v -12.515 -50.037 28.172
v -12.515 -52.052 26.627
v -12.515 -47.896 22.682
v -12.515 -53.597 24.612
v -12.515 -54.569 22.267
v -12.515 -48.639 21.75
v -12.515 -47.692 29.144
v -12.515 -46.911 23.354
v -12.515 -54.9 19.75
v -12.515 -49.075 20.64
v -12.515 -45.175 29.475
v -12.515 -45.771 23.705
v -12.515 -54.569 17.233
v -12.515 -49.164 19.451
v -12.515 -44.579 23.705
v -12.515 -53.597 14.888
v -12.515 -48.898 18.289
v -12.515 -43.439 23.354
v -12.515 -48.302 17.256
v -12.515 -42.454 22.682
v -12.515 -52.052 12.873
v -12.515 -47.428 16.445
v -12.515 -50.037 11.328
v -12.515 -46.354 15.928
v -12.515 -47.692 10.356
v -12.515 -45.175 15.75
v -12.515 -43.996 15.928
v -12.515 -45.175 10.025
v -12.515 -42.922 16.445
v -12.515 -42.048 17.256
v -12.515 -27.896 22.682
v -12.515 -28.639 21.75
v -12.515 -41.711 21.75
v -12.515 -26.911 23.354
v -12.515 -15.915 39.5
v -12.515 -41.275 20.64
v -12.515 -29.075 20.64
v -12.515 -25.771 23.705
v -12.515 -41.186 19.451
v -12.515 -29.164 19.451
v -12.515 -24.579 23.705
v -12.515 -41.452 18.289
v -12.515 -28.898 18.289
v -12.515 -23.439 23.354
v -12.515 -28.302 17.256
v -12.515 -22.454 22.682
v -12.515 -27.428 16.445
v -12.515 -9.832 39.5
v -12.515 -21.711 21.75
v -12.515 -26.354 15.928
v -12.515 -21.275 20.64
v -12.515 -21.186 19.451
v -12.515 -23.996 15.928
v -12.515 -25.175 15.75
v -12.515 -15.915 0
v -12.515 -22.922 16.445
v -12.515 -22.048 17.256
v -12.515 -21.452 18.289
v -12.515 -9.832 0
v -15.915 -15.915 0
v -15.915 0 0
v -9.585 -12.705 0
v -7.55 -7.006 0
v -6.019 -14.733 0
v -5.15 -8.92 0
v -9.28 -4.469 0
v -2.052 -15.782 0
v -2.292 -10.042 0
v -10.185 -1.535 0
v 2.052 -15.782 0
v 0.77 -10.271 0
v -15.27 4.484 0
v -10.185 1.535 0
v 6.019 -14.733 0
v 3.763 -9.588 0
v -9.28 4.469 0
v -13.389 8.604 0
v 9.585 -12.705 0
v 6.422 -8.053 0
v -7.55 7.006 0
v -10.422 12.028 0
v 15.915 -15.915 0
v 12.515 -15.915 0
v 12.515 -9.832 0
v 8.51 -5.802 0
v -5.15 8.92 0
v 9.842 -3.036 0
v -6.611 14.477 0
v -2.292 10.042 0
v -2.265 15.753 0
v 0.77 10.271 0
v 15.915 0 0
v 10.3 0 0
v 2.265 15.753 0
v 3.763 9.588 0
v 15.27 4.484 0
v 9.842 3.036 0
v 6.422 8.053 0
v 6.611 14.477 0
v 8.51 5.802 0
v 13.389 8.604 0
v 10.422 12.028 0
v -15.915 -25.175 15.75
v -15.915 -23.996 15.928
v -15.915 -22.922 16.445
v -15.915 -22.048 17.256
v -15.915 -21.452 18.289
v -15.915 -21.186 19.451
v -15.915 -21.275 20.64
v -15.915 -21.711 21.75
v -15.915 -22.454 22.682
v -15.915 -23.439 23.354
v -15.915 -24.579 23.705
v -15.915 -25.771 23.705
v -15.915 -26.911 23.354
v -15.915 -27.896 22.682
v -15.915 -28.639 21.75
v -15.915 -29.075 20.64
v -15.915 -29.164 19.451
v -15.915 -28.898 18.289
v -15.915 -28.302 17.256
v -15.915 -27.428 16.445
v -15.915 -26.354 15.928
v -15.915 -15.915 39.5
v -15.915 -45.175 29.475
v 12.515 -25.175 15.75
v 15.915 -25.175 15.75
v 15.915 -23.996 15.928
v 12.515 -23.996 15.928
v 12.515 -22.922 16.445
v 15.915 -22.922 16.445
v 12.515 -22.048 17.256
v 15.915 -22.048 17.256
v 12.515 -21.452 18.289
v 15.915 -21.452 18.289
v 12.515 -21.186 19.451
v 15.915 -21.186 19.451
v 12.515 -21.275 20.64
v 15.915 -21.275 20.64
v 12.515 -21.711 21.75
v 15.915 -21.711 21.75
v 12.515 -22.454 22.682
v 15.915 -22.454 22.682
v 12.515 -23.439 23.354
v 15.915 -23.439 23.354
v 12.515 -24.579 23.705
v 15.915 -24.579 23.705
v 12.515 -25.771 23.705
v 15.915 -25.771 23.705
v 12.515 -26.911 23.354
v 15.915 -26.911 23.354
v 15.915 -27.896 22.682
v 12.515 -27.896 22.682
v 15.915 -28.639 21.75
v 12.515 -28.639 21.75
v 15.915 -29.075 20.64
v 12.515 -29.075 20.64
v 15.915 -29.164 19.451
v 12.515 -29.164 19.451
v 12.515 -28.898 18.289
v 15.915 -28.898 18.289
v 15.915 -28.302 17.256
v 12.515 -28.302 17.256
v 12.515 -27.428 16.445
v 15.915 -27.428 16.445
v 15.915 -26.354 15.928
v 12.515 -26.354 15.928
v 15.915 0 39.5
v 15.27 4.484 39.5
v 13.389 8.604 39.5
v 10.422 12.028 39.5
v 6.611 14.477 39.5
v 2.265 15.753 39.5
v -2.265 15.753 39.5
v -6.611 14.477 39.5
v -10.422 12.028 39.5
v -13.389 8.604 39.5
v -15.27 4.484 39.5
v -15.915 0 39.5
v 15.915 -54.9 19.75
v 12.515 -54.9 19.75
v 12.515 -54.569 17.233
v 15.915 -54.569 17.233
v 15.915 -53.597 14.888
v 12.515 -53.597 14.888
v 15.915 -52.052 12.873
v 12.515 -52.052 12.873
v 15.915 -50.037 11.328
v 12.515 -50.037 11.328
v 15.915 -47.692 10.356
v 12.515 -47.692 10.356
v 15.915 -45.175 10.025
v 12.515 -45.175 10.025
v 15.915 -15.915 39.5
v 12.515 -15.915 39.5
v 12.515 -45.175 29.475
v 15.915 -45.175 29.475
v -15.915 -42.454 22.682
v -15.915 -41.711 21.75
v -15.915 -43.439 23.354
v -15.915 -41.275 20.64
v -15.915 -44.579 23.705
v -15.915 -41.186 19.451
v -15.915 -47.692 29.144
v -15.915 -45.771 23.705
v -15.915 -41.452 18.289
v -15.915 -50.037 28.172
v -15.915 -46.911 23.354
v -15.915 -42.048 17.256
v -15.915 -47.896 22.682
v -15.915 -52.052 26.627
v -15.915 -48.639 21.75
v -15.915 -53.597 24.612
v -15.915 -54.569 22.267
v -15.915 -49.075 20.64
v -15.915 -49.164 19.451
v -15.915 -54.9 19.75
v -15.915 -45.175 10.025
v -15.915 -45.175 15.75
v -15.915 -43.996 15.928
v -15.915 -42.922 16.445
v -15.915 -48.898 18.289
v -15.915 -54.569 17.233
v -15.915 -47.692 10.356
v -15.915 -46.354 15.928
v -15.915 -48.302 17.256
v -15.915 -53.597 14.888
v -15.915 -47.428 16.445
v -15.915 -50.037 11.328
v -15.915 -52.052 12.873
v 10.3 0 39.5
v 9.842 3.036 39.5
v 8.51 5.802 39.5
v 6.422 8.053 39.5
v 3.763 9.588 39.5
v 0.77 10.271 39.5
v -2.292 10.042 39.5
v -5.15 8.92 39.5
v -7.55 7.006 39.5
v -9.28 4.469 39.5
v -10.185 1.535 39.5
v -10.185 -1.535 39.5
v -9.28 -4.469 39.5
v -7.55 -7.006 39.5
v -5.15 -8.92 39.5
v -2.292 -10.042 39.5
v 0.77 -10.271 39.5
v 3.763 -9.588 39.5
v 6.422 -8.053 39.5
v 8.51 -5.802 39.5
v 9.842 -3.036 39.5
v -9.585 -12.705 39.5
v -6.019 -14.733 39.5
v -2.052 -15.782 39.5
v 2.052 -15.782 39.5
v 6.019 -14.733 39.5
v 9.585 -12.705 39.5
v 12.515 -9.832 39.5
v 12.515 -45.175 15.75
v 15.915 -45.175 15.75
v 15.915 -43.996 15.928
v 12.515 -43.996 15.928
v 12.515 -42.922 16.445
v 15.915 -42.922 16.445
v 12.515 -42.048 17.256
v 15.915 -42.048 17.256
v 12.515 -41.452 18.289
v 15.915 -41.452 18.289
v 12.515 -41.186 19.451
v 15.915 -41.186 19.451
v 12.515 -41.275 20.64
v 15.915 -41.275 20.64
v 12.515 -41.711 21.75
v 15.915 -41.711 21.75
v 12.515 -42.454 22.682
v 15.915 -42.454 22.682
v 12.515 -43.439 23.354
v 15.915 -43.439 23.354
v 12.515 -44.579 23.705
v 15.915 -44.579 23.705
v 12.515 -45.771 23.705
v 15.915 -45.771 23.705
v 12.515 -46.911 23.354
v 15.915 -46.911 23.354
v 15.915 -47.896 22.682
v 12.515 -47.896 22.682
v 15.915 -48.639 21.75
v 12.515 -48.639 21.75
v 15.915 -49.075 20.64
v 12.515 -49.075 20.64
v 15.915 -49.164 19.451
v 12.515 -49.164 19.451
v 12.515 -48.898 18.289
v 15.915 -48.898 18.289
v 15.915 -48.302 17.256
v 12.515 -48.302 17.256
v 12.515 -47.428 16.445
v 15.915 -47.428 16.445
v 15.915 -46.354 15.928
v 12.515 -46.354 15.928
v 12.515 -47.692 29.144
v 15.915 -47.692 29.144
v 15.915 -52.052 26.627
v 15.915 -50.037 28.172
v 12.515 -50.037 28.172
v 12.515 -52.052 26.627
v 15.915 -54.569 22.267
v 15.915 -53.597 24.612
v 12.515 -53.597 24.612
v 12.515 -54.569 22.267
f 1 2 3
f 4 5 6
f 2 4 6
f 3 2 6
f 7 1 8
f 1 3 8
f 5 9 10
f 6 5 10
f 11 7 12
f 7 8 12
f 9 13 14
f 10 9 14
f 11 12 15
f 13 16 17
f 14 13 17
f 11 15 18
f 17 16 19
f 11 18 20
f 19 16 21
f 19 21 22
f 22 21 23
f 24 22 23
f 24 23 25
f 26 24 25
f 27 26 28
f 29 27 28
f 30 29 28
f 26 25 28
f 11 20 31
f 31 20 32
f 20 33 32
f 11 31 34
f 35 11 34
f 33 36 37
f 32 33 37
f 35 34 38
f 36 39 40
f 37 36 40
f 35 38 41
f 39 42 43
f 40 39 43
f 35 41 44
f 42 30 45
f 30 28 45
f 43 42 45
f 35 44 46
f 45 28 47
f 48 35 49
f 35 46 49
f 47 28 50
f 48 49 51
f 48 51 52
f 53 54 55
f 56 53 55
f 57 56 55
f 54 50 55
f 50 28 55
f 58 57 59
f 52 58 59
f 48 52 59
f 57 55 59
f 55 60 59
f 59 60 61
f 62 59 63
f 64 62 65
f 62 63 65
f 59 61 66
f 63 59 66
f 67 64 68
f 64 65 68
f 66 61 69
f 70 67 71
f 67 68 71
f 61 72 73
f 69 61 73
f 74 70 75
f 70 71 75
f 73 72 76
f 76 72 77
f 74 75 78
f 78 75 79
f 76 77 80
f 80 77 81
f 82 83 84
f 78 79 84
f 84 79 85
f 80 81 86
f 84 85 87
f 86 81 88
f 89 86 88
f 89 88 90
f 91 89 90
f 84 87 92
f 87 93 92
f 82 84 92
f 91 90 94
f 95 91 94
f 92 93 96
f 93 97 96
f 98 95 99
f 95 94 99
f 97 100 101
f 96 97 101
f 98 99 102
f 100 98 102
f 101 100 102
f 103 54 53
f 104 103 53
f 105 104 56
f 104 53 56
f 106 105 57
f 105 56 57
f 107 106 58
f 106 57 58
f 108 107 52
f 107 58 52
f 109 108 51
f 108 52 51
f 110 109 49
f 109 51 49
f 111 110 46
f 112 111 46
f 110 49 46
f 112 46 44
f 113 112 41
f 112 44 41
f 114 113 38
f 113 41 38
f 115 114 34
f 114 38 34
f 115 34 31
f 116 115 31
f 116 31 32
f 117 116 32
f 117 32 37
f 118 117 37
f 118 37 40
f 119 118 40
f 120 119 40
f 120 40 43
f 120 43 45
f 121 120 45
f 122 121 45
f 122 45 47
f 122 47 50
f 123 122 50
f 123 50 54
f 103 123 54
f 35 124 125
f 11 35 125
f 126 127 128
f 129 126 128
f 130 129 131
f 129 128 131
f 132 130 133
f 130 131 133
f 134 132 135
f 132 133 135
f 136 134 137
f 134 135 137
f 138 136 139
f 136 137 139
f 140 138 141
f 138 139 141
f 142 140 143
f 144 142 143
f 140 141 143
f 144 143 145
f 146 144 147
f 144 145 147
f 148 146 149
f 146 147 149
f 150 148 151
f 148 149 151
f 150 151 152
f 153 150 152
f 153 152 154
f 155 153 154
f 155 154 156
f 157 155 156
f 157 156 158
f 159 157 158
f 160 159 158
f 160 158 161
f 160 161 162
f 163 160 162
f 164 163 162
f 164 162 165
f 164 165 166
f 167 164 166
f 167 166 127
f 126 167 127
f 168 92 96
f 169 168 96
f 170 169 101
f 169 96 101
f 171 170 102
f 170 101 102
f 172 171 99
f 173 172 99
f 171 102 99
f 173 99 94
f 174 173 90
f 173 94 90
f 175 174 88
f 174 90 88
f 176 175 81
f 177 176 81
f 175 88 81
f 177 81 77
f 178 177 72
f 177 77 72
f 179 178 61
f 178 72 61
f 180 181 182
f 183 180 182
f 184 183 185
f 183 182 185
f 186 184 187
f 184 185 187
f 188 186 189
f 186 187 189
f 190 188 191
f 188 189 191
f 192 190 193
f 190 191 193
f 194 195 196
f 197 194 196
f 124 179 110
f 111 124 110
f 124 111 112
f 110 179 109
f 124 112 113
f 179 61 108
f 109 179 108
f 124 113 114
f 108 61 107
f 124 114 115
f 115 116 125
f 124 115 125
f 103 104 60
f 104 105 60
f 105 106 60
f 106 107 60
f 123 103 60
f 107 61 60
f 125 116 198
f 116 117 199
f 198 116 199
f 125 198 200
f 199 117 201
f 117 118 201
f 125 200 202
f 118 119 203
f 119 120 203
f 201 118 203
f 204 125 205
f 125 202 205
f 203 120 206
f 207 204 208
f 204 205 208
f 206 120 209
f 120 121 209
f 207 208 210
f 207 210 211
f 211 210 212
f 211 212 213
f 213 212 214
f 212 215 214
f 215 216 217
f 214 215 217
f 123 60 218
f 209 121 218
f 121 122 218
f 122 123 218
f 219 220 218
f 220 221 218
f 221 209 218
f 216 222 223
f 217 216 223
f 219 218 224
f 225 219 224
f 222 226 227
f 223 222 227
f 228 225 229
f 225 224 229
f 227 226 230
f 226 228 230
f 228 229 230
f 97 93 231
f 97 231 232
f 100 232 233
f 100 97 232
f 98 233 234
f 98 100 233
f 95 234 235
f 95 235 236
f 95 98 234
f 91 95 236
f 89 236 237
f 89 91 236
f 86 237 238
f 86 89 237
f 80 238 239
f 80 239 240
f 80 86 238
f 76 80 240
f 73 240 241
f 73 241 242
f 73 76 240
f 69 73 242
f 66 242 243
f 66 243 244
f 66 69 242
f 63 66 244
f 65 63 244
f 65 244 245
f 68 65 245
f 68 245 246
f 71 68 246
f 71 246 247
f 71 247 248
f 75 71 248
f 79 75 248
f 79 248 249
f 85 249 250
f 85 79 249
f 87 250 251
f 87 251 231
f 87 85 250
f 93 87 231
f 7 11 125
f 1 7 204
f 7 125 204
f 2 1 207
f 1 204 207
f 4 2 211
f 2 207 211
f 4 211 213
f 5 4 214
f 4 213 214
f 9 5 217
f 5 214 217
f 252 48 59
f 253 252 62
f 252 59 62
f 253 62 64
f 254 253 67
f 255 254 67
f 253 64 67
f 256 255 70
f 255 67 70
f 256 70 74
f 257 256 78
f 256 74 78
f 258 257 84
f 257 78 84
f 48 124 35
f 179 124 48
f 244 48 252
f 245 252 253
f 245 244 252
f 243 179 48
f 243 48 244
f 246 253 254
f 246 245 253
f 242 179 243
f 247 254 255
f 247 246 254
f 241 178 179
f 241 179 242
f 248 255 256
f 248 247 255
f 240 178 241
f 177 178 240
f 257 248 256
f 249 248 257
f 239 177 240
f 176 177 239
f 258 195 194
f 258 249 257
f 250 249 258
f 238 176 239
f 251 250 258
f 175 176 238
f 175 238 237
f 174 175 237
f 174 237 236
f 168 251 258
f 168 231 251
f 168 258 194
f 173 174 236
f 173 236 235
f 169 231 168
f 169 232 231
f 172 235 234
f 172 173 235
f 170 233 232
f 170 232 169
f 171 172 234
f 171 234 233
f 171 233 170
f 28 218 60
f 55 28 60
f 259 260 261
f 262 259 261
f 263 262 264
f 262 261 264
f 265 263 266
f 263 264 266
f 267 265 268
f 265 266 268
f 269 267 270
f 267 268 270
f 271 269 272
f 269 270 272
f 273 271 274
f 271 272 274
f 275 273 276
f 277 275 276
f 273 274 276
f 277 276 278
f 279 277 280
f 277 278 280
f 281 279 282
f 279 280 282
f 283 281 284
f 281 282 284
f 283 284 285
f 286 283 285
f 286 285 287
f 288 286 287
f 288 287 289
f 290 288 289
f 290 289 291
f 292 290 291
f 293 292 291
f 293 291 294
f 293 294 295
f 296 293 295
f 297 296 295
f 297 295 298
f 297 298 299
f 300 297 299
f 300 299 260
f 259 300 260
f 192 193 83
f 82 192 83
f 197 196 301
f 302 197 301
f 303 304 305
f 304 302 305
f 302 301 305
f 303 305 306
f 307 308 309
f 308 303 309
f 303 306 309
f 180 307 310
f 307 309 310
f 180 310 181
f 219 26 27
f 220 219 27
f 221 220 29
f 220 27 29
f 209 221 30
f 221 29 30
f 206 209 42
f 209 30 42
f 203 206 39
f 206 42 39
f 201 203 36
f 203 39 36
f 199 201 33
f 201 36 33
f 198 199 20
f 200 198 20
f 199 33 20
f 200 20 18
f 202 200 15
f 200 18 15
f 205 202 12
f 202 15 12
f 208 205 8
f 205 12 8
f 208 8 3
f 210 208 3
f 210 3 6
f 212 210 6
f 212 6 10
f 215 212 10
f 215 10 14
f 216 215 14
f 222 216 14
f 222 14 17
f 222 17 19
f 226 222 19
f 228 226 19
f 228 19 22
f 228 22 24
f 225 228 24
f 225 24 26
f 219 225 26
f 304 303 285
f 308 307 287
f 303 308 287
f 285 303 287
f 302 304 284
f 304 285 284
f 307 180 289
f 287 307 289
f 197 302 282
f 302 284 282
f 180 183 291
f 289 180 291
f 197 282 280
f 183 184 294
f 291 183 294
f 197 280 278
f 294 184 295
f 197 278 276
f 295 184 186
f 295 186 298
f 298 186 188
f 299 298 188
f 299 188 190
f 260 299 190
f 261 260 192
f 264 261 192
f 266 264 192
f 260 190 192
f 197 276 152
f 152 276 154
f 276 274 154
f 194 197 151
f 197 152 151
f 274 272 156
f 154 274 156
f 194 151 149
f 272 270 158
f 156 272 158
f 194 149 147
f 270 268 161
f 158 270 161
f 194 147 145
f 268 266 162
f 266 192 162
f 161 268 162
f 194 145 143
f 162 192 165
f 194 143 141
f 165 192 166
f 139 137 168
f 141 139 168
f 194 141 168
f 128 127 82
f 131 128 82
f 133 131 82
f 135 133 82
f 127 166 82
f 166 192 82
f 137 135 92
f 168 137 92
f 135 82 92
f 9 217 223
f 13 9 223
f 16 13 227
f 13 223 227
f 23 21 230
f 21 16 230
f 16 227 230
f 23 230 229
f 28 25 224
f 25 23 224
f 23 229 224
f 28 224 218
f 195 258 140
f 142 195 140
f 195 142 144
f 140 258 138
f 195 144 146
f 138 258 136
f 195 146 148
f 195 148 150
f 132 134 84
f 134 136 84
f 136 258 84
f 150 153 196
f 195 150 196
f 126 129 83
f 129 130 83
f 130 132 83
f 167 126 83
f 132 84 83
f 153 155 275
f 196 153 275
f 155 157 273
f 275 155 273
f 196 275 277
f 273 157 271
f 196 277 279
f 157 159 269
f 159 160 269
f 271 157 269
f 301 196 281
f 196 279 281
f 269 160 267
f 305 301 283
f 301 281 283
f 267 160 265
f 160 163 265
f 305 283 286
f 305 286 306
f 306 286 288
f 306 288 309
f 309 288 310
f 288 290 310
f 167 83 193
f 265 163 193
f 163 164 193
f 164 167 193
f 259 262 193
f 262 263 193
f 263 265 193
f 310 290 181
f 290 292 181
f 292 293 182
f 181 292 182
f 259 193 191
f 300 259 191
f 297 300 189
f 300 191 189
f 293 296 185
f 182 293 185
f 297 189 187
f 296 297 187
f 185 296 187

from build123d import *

# Parameters (mm, degrees)
SKETCH2_R            = 10.3
BOSS_EXTRUDE1_DEPTH  = 39.5
CUT_EXTRUDE1_DEPTH   = 32.83
M7_CLEARANCE_HOLE1_D = 8


with BuildPart() as part:
    # Sketch2 → Boss-Extrude1 (new body)
    with BuildSketch(Plane.XY):
        with BuildLine():
            Line((-15.915, 0), (-15.915, -15.915))
            Line((-15.915, -15.915), (-15.915, -54.9))
            Line((-15.915, -54.9), (-12.515, -54.9))
            Line((-12.515, -54.9), (-12.515, -9.831683477))
            ThreePointArc((-12.515, -9.831683477), (0, -15.915), (12.515, -9.831683477))
            Line((12.515, -9.831683477), (12.515, -54.9))
            Line((12.515, -54.9), (15.915, -54.9))
            Line((15.915, -54.9), (15.915, -27.45))
            Line((15.915, -27.45), (15.915, 0))
            ThreePointArc((15.915, 0), (0, 15.915), (-15.915, 0))
        make_face()
        Circle(SKETCH2_R, mode=Mode.SUBTRACT)
    extrude(amount=BOSS_EXTRUDE1_DEPTH)

    # Sketch3 → Cut-Extrude1 (cut, through all)
    with BuildSketch(Plane.ZY.offset(15.915)):
        with BuildLine():
            ThreePointArc((19.75, -54.9), (12.873386553, -52.051613447), (10.025, -45.175))
            Line((10.025, -45.175), (0, -15.915))
            Line((0, -15.915), (0, -54.9))
            Line((0, -54.9), (19.75, -54.9))
        make_face()
        with BuildLine():
            Line((39.5, -15.915), (29.475, -45.175))
            ThreePointArc((29.475, -45.175), (26.626613447, -52.051613447), (19.75, -54.9))
            Line((19.75, -54.9), (39.5, -54.9))
            Line((39.5, -54.9), (39.5, -15.915))
        make_face()
    extrude(amount=-CUT_EXTRUDE1_DEPTH, mode=Mode.SUBTRACT)

    # M7 Clearance Hole1 (through all)
    with Locations(Plane.ZY.offset(15.915)):
        with Locations((19.75, -45.175), (19.75, -25.175)):
            Hole(M7_CLEARANCE_HOLE1_D / 2)


solid = part.part
